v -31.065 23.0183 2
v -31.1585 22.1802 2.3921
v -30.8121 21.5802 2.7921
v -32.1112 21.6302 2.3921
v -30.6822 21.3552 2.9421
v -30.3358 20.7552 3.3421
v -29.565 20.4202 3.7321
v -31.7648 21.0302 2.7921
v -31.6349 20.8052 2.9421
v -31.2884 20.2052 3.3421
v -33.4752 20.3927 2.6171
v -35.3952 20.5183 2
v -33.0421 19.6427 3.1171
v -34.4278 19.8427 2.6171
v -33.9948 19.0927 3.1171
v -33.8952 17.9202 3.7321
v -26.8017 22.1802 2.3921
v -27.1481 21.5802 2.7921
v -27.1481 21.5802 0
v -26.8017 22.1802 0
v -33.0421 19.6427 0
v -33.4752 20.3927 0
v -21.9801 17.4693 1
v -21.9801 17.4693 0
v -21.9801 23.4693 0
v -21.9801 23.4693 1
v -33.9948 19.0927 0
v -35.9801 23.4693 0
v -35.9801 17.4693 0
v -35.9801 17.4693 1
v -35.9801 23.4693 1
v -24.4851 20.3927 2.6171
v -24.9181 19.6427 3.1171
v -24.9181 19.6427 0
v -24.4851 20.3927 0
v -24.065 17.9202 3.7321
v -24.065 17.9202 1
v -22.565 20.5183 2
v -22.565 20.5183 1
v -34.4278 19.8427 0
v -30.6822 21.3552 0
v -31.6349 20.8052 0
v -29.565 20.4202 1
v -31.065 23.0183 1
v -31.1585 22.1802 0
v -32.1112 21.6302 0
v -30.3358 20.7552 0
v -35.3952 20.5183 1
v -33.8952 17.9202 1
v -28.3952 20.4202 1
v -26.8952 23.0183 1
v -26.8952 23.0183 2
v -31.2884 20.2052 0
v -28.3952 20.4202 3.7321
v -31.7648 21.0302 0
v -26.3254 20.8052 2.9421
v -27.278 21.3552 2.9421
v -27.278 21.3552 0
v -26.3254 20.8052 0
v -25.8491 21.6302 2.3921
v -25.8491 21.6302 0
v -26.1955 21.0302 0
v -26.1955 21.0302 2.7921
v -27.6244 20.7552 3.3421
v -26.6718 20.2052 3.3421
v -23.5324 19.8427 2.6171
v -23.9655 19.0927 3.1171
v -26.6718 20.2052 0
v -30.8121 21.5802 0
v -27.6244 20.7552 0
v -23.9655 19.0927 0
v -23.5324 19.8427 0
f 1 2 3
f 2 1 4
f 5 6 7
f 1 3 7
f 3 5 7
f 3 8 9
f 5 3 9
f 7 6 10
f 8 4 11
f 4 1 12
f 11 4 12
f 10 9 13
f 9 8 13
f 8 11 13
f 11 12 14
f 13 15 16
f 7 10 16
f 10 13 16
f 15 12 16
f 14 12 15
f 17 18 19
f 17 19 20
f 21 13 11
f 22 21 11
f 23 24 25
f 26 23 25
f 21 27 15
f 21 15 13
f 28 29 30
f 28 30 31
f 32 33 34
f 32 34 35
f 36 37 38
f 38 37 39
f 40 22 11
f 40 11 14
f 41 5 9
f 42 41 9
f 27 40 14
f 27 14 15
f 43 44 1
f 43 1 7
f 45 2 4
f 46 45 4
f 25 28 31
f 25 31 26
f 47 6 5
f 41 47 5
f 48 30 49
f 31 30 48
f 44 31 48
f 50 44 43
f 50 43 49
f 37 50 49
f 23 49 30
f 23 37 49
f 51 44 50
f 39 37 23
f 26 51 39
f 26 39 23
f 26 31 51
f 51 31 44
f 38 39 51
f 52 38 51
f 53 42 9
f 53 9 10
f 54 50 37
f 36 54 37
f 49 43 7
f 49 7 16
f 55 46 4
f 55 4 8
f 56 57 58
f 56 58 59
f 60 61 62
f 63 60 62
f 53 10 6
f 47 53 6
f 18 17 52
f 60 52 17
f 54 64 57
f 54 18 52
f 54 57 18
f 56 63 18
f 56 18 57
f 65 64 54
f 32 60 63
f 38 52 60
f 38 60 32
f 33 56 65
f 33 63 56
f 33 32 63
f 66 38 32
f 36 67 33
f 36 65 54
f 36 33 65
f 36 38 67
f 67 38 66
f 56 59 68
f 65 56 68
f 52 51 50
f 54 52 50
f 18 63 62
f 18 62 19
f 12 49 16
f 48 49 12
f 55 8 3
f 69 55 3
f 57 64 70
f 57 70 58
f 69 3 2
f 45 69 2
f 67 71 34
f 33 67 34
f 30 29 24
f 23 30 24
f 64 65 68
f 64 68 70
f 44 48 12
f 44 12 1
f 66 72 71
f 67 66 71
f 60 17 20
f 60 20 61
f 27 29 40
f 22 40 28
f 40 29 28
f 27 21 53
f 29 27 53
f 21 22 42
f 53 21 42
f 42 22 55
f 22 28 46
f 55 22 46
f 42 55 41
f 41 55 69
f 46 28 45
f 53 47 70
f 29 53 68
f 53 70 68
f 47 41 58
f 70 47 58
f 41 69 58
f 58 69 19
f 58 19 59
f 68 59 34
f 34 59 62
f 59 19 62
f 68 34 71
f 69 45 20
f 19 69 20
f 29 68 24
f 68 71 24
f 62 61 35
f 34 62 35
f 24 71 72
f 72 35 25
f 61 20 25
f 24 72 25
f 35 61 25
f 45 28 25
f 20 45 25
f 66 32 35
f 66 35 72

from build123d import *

# Parameters (mm, degrees)
SKETCH1_W           = 14
SKETCH1_H           = 6
BOSS_EXTRUDE1_DEPTH = 1
BOSS_EXTRUDE2_DEPTH = 10
CUT_EXTRUDE1_DEPTH  = 5
CUT_EXTRUDE4_DEPTH  = 5


with BuildPart() as part:
    # Sketch1 → Boss-Extrude1 (new body)
    with BuildSketch(Plane.XY):
        with Locations((-28.980109017, 20.469258927)):
            Rectangle(SKETCH1_W, SKETCH1_H)
    extrude(amount=BOSS_EXTRUDE1_DEPTH)

    # 3DSketch3 → Boss-Extrude2 (add)
    with BuildSketch(Plane(origin=(-35.395172526, 20.518297033, 1), x_dir=(0.9998585349462691, -0.016819931483230154, 0), z_dir=(0, 0, -1))):
        Polygon((0, 0), (4.287464629, -2.572478777), (5.830951895, 0), (1.543487266, 2.572478777), align=None)
    boss_extrude2 = extrude(amount=-BOSS_EXTRUDE2_DEPTH)

    # Sketch5 → Cut-Extrude1 (cut)
    with BuildSketch(Plane(origin=(-17.661696158, -10.196985031, 0), x_dir=(0, 0, 1), z_dir=(-0.8660254037844383, -0.5000000000000009, 0))):
        Polygon((3.732050808, 32.466952736), (11, 32.466952736), (11, 35.466952736), (2, 35.466952736), align=None)
    cut_extrude1 = extrude(amount=-CUT_EXTRUDE1_DEPTH, mode=Mode.SUBTRACT)

    # Sketch8 → Cut-Extrude4 (cut, symmetric, along a direction that is not the sketch's normal)
    with BuildSketch(Plane(origin=(-4.866381794, 8.428820516, 16.857641032), x_dir=(0.9682458365518544, 0.11180339887498851, 0.2236067977499786), z_dir=(-0.24999999999999922, 0.43301270189221724, 0.8660254037844398))):
        Polygon((-27.780523262, 17.561354254), (-26.796645351, 18.05329321), (-27.154416227, 18.768834963), (-28.138294138, 18.276896007), align=None)
        Polygon((-27.288588307, 16.577484344), (-26.304710396, 17.0694233), (-26.662481272, 17.784965053), (-27.646359183, 17.293026097), align=None)
        Polygon((-30.530878873, 16.577488345), (-30.083665278, 15.683061154), (-29.099795368, 16.174996109), (-29.547008963, 17.0694233), align=None)
    cut_extrude4 = extrude(amount=CUT_EXTRUDE4_DEPTH, dir=(0, 0, 1), both=True, mode=Mode.SUBTRACT)

    # Mirror1: Boss-Extrude2, Cut-Extrude1, Cut-Extrude4 across plane
    add(boss_extrude2.mirror(Plane.ZY.offset(28.980109017)))
    add(cut_extrude1.mirror(Plane.ZY.offset(28.980109017)), mode=Mode.SUBTRACT)
    add(cut_extrude4.mirror(Plane.ZY.offset(28.980109017)), mode=Mode.SUBTRACT)


solid = part.part
